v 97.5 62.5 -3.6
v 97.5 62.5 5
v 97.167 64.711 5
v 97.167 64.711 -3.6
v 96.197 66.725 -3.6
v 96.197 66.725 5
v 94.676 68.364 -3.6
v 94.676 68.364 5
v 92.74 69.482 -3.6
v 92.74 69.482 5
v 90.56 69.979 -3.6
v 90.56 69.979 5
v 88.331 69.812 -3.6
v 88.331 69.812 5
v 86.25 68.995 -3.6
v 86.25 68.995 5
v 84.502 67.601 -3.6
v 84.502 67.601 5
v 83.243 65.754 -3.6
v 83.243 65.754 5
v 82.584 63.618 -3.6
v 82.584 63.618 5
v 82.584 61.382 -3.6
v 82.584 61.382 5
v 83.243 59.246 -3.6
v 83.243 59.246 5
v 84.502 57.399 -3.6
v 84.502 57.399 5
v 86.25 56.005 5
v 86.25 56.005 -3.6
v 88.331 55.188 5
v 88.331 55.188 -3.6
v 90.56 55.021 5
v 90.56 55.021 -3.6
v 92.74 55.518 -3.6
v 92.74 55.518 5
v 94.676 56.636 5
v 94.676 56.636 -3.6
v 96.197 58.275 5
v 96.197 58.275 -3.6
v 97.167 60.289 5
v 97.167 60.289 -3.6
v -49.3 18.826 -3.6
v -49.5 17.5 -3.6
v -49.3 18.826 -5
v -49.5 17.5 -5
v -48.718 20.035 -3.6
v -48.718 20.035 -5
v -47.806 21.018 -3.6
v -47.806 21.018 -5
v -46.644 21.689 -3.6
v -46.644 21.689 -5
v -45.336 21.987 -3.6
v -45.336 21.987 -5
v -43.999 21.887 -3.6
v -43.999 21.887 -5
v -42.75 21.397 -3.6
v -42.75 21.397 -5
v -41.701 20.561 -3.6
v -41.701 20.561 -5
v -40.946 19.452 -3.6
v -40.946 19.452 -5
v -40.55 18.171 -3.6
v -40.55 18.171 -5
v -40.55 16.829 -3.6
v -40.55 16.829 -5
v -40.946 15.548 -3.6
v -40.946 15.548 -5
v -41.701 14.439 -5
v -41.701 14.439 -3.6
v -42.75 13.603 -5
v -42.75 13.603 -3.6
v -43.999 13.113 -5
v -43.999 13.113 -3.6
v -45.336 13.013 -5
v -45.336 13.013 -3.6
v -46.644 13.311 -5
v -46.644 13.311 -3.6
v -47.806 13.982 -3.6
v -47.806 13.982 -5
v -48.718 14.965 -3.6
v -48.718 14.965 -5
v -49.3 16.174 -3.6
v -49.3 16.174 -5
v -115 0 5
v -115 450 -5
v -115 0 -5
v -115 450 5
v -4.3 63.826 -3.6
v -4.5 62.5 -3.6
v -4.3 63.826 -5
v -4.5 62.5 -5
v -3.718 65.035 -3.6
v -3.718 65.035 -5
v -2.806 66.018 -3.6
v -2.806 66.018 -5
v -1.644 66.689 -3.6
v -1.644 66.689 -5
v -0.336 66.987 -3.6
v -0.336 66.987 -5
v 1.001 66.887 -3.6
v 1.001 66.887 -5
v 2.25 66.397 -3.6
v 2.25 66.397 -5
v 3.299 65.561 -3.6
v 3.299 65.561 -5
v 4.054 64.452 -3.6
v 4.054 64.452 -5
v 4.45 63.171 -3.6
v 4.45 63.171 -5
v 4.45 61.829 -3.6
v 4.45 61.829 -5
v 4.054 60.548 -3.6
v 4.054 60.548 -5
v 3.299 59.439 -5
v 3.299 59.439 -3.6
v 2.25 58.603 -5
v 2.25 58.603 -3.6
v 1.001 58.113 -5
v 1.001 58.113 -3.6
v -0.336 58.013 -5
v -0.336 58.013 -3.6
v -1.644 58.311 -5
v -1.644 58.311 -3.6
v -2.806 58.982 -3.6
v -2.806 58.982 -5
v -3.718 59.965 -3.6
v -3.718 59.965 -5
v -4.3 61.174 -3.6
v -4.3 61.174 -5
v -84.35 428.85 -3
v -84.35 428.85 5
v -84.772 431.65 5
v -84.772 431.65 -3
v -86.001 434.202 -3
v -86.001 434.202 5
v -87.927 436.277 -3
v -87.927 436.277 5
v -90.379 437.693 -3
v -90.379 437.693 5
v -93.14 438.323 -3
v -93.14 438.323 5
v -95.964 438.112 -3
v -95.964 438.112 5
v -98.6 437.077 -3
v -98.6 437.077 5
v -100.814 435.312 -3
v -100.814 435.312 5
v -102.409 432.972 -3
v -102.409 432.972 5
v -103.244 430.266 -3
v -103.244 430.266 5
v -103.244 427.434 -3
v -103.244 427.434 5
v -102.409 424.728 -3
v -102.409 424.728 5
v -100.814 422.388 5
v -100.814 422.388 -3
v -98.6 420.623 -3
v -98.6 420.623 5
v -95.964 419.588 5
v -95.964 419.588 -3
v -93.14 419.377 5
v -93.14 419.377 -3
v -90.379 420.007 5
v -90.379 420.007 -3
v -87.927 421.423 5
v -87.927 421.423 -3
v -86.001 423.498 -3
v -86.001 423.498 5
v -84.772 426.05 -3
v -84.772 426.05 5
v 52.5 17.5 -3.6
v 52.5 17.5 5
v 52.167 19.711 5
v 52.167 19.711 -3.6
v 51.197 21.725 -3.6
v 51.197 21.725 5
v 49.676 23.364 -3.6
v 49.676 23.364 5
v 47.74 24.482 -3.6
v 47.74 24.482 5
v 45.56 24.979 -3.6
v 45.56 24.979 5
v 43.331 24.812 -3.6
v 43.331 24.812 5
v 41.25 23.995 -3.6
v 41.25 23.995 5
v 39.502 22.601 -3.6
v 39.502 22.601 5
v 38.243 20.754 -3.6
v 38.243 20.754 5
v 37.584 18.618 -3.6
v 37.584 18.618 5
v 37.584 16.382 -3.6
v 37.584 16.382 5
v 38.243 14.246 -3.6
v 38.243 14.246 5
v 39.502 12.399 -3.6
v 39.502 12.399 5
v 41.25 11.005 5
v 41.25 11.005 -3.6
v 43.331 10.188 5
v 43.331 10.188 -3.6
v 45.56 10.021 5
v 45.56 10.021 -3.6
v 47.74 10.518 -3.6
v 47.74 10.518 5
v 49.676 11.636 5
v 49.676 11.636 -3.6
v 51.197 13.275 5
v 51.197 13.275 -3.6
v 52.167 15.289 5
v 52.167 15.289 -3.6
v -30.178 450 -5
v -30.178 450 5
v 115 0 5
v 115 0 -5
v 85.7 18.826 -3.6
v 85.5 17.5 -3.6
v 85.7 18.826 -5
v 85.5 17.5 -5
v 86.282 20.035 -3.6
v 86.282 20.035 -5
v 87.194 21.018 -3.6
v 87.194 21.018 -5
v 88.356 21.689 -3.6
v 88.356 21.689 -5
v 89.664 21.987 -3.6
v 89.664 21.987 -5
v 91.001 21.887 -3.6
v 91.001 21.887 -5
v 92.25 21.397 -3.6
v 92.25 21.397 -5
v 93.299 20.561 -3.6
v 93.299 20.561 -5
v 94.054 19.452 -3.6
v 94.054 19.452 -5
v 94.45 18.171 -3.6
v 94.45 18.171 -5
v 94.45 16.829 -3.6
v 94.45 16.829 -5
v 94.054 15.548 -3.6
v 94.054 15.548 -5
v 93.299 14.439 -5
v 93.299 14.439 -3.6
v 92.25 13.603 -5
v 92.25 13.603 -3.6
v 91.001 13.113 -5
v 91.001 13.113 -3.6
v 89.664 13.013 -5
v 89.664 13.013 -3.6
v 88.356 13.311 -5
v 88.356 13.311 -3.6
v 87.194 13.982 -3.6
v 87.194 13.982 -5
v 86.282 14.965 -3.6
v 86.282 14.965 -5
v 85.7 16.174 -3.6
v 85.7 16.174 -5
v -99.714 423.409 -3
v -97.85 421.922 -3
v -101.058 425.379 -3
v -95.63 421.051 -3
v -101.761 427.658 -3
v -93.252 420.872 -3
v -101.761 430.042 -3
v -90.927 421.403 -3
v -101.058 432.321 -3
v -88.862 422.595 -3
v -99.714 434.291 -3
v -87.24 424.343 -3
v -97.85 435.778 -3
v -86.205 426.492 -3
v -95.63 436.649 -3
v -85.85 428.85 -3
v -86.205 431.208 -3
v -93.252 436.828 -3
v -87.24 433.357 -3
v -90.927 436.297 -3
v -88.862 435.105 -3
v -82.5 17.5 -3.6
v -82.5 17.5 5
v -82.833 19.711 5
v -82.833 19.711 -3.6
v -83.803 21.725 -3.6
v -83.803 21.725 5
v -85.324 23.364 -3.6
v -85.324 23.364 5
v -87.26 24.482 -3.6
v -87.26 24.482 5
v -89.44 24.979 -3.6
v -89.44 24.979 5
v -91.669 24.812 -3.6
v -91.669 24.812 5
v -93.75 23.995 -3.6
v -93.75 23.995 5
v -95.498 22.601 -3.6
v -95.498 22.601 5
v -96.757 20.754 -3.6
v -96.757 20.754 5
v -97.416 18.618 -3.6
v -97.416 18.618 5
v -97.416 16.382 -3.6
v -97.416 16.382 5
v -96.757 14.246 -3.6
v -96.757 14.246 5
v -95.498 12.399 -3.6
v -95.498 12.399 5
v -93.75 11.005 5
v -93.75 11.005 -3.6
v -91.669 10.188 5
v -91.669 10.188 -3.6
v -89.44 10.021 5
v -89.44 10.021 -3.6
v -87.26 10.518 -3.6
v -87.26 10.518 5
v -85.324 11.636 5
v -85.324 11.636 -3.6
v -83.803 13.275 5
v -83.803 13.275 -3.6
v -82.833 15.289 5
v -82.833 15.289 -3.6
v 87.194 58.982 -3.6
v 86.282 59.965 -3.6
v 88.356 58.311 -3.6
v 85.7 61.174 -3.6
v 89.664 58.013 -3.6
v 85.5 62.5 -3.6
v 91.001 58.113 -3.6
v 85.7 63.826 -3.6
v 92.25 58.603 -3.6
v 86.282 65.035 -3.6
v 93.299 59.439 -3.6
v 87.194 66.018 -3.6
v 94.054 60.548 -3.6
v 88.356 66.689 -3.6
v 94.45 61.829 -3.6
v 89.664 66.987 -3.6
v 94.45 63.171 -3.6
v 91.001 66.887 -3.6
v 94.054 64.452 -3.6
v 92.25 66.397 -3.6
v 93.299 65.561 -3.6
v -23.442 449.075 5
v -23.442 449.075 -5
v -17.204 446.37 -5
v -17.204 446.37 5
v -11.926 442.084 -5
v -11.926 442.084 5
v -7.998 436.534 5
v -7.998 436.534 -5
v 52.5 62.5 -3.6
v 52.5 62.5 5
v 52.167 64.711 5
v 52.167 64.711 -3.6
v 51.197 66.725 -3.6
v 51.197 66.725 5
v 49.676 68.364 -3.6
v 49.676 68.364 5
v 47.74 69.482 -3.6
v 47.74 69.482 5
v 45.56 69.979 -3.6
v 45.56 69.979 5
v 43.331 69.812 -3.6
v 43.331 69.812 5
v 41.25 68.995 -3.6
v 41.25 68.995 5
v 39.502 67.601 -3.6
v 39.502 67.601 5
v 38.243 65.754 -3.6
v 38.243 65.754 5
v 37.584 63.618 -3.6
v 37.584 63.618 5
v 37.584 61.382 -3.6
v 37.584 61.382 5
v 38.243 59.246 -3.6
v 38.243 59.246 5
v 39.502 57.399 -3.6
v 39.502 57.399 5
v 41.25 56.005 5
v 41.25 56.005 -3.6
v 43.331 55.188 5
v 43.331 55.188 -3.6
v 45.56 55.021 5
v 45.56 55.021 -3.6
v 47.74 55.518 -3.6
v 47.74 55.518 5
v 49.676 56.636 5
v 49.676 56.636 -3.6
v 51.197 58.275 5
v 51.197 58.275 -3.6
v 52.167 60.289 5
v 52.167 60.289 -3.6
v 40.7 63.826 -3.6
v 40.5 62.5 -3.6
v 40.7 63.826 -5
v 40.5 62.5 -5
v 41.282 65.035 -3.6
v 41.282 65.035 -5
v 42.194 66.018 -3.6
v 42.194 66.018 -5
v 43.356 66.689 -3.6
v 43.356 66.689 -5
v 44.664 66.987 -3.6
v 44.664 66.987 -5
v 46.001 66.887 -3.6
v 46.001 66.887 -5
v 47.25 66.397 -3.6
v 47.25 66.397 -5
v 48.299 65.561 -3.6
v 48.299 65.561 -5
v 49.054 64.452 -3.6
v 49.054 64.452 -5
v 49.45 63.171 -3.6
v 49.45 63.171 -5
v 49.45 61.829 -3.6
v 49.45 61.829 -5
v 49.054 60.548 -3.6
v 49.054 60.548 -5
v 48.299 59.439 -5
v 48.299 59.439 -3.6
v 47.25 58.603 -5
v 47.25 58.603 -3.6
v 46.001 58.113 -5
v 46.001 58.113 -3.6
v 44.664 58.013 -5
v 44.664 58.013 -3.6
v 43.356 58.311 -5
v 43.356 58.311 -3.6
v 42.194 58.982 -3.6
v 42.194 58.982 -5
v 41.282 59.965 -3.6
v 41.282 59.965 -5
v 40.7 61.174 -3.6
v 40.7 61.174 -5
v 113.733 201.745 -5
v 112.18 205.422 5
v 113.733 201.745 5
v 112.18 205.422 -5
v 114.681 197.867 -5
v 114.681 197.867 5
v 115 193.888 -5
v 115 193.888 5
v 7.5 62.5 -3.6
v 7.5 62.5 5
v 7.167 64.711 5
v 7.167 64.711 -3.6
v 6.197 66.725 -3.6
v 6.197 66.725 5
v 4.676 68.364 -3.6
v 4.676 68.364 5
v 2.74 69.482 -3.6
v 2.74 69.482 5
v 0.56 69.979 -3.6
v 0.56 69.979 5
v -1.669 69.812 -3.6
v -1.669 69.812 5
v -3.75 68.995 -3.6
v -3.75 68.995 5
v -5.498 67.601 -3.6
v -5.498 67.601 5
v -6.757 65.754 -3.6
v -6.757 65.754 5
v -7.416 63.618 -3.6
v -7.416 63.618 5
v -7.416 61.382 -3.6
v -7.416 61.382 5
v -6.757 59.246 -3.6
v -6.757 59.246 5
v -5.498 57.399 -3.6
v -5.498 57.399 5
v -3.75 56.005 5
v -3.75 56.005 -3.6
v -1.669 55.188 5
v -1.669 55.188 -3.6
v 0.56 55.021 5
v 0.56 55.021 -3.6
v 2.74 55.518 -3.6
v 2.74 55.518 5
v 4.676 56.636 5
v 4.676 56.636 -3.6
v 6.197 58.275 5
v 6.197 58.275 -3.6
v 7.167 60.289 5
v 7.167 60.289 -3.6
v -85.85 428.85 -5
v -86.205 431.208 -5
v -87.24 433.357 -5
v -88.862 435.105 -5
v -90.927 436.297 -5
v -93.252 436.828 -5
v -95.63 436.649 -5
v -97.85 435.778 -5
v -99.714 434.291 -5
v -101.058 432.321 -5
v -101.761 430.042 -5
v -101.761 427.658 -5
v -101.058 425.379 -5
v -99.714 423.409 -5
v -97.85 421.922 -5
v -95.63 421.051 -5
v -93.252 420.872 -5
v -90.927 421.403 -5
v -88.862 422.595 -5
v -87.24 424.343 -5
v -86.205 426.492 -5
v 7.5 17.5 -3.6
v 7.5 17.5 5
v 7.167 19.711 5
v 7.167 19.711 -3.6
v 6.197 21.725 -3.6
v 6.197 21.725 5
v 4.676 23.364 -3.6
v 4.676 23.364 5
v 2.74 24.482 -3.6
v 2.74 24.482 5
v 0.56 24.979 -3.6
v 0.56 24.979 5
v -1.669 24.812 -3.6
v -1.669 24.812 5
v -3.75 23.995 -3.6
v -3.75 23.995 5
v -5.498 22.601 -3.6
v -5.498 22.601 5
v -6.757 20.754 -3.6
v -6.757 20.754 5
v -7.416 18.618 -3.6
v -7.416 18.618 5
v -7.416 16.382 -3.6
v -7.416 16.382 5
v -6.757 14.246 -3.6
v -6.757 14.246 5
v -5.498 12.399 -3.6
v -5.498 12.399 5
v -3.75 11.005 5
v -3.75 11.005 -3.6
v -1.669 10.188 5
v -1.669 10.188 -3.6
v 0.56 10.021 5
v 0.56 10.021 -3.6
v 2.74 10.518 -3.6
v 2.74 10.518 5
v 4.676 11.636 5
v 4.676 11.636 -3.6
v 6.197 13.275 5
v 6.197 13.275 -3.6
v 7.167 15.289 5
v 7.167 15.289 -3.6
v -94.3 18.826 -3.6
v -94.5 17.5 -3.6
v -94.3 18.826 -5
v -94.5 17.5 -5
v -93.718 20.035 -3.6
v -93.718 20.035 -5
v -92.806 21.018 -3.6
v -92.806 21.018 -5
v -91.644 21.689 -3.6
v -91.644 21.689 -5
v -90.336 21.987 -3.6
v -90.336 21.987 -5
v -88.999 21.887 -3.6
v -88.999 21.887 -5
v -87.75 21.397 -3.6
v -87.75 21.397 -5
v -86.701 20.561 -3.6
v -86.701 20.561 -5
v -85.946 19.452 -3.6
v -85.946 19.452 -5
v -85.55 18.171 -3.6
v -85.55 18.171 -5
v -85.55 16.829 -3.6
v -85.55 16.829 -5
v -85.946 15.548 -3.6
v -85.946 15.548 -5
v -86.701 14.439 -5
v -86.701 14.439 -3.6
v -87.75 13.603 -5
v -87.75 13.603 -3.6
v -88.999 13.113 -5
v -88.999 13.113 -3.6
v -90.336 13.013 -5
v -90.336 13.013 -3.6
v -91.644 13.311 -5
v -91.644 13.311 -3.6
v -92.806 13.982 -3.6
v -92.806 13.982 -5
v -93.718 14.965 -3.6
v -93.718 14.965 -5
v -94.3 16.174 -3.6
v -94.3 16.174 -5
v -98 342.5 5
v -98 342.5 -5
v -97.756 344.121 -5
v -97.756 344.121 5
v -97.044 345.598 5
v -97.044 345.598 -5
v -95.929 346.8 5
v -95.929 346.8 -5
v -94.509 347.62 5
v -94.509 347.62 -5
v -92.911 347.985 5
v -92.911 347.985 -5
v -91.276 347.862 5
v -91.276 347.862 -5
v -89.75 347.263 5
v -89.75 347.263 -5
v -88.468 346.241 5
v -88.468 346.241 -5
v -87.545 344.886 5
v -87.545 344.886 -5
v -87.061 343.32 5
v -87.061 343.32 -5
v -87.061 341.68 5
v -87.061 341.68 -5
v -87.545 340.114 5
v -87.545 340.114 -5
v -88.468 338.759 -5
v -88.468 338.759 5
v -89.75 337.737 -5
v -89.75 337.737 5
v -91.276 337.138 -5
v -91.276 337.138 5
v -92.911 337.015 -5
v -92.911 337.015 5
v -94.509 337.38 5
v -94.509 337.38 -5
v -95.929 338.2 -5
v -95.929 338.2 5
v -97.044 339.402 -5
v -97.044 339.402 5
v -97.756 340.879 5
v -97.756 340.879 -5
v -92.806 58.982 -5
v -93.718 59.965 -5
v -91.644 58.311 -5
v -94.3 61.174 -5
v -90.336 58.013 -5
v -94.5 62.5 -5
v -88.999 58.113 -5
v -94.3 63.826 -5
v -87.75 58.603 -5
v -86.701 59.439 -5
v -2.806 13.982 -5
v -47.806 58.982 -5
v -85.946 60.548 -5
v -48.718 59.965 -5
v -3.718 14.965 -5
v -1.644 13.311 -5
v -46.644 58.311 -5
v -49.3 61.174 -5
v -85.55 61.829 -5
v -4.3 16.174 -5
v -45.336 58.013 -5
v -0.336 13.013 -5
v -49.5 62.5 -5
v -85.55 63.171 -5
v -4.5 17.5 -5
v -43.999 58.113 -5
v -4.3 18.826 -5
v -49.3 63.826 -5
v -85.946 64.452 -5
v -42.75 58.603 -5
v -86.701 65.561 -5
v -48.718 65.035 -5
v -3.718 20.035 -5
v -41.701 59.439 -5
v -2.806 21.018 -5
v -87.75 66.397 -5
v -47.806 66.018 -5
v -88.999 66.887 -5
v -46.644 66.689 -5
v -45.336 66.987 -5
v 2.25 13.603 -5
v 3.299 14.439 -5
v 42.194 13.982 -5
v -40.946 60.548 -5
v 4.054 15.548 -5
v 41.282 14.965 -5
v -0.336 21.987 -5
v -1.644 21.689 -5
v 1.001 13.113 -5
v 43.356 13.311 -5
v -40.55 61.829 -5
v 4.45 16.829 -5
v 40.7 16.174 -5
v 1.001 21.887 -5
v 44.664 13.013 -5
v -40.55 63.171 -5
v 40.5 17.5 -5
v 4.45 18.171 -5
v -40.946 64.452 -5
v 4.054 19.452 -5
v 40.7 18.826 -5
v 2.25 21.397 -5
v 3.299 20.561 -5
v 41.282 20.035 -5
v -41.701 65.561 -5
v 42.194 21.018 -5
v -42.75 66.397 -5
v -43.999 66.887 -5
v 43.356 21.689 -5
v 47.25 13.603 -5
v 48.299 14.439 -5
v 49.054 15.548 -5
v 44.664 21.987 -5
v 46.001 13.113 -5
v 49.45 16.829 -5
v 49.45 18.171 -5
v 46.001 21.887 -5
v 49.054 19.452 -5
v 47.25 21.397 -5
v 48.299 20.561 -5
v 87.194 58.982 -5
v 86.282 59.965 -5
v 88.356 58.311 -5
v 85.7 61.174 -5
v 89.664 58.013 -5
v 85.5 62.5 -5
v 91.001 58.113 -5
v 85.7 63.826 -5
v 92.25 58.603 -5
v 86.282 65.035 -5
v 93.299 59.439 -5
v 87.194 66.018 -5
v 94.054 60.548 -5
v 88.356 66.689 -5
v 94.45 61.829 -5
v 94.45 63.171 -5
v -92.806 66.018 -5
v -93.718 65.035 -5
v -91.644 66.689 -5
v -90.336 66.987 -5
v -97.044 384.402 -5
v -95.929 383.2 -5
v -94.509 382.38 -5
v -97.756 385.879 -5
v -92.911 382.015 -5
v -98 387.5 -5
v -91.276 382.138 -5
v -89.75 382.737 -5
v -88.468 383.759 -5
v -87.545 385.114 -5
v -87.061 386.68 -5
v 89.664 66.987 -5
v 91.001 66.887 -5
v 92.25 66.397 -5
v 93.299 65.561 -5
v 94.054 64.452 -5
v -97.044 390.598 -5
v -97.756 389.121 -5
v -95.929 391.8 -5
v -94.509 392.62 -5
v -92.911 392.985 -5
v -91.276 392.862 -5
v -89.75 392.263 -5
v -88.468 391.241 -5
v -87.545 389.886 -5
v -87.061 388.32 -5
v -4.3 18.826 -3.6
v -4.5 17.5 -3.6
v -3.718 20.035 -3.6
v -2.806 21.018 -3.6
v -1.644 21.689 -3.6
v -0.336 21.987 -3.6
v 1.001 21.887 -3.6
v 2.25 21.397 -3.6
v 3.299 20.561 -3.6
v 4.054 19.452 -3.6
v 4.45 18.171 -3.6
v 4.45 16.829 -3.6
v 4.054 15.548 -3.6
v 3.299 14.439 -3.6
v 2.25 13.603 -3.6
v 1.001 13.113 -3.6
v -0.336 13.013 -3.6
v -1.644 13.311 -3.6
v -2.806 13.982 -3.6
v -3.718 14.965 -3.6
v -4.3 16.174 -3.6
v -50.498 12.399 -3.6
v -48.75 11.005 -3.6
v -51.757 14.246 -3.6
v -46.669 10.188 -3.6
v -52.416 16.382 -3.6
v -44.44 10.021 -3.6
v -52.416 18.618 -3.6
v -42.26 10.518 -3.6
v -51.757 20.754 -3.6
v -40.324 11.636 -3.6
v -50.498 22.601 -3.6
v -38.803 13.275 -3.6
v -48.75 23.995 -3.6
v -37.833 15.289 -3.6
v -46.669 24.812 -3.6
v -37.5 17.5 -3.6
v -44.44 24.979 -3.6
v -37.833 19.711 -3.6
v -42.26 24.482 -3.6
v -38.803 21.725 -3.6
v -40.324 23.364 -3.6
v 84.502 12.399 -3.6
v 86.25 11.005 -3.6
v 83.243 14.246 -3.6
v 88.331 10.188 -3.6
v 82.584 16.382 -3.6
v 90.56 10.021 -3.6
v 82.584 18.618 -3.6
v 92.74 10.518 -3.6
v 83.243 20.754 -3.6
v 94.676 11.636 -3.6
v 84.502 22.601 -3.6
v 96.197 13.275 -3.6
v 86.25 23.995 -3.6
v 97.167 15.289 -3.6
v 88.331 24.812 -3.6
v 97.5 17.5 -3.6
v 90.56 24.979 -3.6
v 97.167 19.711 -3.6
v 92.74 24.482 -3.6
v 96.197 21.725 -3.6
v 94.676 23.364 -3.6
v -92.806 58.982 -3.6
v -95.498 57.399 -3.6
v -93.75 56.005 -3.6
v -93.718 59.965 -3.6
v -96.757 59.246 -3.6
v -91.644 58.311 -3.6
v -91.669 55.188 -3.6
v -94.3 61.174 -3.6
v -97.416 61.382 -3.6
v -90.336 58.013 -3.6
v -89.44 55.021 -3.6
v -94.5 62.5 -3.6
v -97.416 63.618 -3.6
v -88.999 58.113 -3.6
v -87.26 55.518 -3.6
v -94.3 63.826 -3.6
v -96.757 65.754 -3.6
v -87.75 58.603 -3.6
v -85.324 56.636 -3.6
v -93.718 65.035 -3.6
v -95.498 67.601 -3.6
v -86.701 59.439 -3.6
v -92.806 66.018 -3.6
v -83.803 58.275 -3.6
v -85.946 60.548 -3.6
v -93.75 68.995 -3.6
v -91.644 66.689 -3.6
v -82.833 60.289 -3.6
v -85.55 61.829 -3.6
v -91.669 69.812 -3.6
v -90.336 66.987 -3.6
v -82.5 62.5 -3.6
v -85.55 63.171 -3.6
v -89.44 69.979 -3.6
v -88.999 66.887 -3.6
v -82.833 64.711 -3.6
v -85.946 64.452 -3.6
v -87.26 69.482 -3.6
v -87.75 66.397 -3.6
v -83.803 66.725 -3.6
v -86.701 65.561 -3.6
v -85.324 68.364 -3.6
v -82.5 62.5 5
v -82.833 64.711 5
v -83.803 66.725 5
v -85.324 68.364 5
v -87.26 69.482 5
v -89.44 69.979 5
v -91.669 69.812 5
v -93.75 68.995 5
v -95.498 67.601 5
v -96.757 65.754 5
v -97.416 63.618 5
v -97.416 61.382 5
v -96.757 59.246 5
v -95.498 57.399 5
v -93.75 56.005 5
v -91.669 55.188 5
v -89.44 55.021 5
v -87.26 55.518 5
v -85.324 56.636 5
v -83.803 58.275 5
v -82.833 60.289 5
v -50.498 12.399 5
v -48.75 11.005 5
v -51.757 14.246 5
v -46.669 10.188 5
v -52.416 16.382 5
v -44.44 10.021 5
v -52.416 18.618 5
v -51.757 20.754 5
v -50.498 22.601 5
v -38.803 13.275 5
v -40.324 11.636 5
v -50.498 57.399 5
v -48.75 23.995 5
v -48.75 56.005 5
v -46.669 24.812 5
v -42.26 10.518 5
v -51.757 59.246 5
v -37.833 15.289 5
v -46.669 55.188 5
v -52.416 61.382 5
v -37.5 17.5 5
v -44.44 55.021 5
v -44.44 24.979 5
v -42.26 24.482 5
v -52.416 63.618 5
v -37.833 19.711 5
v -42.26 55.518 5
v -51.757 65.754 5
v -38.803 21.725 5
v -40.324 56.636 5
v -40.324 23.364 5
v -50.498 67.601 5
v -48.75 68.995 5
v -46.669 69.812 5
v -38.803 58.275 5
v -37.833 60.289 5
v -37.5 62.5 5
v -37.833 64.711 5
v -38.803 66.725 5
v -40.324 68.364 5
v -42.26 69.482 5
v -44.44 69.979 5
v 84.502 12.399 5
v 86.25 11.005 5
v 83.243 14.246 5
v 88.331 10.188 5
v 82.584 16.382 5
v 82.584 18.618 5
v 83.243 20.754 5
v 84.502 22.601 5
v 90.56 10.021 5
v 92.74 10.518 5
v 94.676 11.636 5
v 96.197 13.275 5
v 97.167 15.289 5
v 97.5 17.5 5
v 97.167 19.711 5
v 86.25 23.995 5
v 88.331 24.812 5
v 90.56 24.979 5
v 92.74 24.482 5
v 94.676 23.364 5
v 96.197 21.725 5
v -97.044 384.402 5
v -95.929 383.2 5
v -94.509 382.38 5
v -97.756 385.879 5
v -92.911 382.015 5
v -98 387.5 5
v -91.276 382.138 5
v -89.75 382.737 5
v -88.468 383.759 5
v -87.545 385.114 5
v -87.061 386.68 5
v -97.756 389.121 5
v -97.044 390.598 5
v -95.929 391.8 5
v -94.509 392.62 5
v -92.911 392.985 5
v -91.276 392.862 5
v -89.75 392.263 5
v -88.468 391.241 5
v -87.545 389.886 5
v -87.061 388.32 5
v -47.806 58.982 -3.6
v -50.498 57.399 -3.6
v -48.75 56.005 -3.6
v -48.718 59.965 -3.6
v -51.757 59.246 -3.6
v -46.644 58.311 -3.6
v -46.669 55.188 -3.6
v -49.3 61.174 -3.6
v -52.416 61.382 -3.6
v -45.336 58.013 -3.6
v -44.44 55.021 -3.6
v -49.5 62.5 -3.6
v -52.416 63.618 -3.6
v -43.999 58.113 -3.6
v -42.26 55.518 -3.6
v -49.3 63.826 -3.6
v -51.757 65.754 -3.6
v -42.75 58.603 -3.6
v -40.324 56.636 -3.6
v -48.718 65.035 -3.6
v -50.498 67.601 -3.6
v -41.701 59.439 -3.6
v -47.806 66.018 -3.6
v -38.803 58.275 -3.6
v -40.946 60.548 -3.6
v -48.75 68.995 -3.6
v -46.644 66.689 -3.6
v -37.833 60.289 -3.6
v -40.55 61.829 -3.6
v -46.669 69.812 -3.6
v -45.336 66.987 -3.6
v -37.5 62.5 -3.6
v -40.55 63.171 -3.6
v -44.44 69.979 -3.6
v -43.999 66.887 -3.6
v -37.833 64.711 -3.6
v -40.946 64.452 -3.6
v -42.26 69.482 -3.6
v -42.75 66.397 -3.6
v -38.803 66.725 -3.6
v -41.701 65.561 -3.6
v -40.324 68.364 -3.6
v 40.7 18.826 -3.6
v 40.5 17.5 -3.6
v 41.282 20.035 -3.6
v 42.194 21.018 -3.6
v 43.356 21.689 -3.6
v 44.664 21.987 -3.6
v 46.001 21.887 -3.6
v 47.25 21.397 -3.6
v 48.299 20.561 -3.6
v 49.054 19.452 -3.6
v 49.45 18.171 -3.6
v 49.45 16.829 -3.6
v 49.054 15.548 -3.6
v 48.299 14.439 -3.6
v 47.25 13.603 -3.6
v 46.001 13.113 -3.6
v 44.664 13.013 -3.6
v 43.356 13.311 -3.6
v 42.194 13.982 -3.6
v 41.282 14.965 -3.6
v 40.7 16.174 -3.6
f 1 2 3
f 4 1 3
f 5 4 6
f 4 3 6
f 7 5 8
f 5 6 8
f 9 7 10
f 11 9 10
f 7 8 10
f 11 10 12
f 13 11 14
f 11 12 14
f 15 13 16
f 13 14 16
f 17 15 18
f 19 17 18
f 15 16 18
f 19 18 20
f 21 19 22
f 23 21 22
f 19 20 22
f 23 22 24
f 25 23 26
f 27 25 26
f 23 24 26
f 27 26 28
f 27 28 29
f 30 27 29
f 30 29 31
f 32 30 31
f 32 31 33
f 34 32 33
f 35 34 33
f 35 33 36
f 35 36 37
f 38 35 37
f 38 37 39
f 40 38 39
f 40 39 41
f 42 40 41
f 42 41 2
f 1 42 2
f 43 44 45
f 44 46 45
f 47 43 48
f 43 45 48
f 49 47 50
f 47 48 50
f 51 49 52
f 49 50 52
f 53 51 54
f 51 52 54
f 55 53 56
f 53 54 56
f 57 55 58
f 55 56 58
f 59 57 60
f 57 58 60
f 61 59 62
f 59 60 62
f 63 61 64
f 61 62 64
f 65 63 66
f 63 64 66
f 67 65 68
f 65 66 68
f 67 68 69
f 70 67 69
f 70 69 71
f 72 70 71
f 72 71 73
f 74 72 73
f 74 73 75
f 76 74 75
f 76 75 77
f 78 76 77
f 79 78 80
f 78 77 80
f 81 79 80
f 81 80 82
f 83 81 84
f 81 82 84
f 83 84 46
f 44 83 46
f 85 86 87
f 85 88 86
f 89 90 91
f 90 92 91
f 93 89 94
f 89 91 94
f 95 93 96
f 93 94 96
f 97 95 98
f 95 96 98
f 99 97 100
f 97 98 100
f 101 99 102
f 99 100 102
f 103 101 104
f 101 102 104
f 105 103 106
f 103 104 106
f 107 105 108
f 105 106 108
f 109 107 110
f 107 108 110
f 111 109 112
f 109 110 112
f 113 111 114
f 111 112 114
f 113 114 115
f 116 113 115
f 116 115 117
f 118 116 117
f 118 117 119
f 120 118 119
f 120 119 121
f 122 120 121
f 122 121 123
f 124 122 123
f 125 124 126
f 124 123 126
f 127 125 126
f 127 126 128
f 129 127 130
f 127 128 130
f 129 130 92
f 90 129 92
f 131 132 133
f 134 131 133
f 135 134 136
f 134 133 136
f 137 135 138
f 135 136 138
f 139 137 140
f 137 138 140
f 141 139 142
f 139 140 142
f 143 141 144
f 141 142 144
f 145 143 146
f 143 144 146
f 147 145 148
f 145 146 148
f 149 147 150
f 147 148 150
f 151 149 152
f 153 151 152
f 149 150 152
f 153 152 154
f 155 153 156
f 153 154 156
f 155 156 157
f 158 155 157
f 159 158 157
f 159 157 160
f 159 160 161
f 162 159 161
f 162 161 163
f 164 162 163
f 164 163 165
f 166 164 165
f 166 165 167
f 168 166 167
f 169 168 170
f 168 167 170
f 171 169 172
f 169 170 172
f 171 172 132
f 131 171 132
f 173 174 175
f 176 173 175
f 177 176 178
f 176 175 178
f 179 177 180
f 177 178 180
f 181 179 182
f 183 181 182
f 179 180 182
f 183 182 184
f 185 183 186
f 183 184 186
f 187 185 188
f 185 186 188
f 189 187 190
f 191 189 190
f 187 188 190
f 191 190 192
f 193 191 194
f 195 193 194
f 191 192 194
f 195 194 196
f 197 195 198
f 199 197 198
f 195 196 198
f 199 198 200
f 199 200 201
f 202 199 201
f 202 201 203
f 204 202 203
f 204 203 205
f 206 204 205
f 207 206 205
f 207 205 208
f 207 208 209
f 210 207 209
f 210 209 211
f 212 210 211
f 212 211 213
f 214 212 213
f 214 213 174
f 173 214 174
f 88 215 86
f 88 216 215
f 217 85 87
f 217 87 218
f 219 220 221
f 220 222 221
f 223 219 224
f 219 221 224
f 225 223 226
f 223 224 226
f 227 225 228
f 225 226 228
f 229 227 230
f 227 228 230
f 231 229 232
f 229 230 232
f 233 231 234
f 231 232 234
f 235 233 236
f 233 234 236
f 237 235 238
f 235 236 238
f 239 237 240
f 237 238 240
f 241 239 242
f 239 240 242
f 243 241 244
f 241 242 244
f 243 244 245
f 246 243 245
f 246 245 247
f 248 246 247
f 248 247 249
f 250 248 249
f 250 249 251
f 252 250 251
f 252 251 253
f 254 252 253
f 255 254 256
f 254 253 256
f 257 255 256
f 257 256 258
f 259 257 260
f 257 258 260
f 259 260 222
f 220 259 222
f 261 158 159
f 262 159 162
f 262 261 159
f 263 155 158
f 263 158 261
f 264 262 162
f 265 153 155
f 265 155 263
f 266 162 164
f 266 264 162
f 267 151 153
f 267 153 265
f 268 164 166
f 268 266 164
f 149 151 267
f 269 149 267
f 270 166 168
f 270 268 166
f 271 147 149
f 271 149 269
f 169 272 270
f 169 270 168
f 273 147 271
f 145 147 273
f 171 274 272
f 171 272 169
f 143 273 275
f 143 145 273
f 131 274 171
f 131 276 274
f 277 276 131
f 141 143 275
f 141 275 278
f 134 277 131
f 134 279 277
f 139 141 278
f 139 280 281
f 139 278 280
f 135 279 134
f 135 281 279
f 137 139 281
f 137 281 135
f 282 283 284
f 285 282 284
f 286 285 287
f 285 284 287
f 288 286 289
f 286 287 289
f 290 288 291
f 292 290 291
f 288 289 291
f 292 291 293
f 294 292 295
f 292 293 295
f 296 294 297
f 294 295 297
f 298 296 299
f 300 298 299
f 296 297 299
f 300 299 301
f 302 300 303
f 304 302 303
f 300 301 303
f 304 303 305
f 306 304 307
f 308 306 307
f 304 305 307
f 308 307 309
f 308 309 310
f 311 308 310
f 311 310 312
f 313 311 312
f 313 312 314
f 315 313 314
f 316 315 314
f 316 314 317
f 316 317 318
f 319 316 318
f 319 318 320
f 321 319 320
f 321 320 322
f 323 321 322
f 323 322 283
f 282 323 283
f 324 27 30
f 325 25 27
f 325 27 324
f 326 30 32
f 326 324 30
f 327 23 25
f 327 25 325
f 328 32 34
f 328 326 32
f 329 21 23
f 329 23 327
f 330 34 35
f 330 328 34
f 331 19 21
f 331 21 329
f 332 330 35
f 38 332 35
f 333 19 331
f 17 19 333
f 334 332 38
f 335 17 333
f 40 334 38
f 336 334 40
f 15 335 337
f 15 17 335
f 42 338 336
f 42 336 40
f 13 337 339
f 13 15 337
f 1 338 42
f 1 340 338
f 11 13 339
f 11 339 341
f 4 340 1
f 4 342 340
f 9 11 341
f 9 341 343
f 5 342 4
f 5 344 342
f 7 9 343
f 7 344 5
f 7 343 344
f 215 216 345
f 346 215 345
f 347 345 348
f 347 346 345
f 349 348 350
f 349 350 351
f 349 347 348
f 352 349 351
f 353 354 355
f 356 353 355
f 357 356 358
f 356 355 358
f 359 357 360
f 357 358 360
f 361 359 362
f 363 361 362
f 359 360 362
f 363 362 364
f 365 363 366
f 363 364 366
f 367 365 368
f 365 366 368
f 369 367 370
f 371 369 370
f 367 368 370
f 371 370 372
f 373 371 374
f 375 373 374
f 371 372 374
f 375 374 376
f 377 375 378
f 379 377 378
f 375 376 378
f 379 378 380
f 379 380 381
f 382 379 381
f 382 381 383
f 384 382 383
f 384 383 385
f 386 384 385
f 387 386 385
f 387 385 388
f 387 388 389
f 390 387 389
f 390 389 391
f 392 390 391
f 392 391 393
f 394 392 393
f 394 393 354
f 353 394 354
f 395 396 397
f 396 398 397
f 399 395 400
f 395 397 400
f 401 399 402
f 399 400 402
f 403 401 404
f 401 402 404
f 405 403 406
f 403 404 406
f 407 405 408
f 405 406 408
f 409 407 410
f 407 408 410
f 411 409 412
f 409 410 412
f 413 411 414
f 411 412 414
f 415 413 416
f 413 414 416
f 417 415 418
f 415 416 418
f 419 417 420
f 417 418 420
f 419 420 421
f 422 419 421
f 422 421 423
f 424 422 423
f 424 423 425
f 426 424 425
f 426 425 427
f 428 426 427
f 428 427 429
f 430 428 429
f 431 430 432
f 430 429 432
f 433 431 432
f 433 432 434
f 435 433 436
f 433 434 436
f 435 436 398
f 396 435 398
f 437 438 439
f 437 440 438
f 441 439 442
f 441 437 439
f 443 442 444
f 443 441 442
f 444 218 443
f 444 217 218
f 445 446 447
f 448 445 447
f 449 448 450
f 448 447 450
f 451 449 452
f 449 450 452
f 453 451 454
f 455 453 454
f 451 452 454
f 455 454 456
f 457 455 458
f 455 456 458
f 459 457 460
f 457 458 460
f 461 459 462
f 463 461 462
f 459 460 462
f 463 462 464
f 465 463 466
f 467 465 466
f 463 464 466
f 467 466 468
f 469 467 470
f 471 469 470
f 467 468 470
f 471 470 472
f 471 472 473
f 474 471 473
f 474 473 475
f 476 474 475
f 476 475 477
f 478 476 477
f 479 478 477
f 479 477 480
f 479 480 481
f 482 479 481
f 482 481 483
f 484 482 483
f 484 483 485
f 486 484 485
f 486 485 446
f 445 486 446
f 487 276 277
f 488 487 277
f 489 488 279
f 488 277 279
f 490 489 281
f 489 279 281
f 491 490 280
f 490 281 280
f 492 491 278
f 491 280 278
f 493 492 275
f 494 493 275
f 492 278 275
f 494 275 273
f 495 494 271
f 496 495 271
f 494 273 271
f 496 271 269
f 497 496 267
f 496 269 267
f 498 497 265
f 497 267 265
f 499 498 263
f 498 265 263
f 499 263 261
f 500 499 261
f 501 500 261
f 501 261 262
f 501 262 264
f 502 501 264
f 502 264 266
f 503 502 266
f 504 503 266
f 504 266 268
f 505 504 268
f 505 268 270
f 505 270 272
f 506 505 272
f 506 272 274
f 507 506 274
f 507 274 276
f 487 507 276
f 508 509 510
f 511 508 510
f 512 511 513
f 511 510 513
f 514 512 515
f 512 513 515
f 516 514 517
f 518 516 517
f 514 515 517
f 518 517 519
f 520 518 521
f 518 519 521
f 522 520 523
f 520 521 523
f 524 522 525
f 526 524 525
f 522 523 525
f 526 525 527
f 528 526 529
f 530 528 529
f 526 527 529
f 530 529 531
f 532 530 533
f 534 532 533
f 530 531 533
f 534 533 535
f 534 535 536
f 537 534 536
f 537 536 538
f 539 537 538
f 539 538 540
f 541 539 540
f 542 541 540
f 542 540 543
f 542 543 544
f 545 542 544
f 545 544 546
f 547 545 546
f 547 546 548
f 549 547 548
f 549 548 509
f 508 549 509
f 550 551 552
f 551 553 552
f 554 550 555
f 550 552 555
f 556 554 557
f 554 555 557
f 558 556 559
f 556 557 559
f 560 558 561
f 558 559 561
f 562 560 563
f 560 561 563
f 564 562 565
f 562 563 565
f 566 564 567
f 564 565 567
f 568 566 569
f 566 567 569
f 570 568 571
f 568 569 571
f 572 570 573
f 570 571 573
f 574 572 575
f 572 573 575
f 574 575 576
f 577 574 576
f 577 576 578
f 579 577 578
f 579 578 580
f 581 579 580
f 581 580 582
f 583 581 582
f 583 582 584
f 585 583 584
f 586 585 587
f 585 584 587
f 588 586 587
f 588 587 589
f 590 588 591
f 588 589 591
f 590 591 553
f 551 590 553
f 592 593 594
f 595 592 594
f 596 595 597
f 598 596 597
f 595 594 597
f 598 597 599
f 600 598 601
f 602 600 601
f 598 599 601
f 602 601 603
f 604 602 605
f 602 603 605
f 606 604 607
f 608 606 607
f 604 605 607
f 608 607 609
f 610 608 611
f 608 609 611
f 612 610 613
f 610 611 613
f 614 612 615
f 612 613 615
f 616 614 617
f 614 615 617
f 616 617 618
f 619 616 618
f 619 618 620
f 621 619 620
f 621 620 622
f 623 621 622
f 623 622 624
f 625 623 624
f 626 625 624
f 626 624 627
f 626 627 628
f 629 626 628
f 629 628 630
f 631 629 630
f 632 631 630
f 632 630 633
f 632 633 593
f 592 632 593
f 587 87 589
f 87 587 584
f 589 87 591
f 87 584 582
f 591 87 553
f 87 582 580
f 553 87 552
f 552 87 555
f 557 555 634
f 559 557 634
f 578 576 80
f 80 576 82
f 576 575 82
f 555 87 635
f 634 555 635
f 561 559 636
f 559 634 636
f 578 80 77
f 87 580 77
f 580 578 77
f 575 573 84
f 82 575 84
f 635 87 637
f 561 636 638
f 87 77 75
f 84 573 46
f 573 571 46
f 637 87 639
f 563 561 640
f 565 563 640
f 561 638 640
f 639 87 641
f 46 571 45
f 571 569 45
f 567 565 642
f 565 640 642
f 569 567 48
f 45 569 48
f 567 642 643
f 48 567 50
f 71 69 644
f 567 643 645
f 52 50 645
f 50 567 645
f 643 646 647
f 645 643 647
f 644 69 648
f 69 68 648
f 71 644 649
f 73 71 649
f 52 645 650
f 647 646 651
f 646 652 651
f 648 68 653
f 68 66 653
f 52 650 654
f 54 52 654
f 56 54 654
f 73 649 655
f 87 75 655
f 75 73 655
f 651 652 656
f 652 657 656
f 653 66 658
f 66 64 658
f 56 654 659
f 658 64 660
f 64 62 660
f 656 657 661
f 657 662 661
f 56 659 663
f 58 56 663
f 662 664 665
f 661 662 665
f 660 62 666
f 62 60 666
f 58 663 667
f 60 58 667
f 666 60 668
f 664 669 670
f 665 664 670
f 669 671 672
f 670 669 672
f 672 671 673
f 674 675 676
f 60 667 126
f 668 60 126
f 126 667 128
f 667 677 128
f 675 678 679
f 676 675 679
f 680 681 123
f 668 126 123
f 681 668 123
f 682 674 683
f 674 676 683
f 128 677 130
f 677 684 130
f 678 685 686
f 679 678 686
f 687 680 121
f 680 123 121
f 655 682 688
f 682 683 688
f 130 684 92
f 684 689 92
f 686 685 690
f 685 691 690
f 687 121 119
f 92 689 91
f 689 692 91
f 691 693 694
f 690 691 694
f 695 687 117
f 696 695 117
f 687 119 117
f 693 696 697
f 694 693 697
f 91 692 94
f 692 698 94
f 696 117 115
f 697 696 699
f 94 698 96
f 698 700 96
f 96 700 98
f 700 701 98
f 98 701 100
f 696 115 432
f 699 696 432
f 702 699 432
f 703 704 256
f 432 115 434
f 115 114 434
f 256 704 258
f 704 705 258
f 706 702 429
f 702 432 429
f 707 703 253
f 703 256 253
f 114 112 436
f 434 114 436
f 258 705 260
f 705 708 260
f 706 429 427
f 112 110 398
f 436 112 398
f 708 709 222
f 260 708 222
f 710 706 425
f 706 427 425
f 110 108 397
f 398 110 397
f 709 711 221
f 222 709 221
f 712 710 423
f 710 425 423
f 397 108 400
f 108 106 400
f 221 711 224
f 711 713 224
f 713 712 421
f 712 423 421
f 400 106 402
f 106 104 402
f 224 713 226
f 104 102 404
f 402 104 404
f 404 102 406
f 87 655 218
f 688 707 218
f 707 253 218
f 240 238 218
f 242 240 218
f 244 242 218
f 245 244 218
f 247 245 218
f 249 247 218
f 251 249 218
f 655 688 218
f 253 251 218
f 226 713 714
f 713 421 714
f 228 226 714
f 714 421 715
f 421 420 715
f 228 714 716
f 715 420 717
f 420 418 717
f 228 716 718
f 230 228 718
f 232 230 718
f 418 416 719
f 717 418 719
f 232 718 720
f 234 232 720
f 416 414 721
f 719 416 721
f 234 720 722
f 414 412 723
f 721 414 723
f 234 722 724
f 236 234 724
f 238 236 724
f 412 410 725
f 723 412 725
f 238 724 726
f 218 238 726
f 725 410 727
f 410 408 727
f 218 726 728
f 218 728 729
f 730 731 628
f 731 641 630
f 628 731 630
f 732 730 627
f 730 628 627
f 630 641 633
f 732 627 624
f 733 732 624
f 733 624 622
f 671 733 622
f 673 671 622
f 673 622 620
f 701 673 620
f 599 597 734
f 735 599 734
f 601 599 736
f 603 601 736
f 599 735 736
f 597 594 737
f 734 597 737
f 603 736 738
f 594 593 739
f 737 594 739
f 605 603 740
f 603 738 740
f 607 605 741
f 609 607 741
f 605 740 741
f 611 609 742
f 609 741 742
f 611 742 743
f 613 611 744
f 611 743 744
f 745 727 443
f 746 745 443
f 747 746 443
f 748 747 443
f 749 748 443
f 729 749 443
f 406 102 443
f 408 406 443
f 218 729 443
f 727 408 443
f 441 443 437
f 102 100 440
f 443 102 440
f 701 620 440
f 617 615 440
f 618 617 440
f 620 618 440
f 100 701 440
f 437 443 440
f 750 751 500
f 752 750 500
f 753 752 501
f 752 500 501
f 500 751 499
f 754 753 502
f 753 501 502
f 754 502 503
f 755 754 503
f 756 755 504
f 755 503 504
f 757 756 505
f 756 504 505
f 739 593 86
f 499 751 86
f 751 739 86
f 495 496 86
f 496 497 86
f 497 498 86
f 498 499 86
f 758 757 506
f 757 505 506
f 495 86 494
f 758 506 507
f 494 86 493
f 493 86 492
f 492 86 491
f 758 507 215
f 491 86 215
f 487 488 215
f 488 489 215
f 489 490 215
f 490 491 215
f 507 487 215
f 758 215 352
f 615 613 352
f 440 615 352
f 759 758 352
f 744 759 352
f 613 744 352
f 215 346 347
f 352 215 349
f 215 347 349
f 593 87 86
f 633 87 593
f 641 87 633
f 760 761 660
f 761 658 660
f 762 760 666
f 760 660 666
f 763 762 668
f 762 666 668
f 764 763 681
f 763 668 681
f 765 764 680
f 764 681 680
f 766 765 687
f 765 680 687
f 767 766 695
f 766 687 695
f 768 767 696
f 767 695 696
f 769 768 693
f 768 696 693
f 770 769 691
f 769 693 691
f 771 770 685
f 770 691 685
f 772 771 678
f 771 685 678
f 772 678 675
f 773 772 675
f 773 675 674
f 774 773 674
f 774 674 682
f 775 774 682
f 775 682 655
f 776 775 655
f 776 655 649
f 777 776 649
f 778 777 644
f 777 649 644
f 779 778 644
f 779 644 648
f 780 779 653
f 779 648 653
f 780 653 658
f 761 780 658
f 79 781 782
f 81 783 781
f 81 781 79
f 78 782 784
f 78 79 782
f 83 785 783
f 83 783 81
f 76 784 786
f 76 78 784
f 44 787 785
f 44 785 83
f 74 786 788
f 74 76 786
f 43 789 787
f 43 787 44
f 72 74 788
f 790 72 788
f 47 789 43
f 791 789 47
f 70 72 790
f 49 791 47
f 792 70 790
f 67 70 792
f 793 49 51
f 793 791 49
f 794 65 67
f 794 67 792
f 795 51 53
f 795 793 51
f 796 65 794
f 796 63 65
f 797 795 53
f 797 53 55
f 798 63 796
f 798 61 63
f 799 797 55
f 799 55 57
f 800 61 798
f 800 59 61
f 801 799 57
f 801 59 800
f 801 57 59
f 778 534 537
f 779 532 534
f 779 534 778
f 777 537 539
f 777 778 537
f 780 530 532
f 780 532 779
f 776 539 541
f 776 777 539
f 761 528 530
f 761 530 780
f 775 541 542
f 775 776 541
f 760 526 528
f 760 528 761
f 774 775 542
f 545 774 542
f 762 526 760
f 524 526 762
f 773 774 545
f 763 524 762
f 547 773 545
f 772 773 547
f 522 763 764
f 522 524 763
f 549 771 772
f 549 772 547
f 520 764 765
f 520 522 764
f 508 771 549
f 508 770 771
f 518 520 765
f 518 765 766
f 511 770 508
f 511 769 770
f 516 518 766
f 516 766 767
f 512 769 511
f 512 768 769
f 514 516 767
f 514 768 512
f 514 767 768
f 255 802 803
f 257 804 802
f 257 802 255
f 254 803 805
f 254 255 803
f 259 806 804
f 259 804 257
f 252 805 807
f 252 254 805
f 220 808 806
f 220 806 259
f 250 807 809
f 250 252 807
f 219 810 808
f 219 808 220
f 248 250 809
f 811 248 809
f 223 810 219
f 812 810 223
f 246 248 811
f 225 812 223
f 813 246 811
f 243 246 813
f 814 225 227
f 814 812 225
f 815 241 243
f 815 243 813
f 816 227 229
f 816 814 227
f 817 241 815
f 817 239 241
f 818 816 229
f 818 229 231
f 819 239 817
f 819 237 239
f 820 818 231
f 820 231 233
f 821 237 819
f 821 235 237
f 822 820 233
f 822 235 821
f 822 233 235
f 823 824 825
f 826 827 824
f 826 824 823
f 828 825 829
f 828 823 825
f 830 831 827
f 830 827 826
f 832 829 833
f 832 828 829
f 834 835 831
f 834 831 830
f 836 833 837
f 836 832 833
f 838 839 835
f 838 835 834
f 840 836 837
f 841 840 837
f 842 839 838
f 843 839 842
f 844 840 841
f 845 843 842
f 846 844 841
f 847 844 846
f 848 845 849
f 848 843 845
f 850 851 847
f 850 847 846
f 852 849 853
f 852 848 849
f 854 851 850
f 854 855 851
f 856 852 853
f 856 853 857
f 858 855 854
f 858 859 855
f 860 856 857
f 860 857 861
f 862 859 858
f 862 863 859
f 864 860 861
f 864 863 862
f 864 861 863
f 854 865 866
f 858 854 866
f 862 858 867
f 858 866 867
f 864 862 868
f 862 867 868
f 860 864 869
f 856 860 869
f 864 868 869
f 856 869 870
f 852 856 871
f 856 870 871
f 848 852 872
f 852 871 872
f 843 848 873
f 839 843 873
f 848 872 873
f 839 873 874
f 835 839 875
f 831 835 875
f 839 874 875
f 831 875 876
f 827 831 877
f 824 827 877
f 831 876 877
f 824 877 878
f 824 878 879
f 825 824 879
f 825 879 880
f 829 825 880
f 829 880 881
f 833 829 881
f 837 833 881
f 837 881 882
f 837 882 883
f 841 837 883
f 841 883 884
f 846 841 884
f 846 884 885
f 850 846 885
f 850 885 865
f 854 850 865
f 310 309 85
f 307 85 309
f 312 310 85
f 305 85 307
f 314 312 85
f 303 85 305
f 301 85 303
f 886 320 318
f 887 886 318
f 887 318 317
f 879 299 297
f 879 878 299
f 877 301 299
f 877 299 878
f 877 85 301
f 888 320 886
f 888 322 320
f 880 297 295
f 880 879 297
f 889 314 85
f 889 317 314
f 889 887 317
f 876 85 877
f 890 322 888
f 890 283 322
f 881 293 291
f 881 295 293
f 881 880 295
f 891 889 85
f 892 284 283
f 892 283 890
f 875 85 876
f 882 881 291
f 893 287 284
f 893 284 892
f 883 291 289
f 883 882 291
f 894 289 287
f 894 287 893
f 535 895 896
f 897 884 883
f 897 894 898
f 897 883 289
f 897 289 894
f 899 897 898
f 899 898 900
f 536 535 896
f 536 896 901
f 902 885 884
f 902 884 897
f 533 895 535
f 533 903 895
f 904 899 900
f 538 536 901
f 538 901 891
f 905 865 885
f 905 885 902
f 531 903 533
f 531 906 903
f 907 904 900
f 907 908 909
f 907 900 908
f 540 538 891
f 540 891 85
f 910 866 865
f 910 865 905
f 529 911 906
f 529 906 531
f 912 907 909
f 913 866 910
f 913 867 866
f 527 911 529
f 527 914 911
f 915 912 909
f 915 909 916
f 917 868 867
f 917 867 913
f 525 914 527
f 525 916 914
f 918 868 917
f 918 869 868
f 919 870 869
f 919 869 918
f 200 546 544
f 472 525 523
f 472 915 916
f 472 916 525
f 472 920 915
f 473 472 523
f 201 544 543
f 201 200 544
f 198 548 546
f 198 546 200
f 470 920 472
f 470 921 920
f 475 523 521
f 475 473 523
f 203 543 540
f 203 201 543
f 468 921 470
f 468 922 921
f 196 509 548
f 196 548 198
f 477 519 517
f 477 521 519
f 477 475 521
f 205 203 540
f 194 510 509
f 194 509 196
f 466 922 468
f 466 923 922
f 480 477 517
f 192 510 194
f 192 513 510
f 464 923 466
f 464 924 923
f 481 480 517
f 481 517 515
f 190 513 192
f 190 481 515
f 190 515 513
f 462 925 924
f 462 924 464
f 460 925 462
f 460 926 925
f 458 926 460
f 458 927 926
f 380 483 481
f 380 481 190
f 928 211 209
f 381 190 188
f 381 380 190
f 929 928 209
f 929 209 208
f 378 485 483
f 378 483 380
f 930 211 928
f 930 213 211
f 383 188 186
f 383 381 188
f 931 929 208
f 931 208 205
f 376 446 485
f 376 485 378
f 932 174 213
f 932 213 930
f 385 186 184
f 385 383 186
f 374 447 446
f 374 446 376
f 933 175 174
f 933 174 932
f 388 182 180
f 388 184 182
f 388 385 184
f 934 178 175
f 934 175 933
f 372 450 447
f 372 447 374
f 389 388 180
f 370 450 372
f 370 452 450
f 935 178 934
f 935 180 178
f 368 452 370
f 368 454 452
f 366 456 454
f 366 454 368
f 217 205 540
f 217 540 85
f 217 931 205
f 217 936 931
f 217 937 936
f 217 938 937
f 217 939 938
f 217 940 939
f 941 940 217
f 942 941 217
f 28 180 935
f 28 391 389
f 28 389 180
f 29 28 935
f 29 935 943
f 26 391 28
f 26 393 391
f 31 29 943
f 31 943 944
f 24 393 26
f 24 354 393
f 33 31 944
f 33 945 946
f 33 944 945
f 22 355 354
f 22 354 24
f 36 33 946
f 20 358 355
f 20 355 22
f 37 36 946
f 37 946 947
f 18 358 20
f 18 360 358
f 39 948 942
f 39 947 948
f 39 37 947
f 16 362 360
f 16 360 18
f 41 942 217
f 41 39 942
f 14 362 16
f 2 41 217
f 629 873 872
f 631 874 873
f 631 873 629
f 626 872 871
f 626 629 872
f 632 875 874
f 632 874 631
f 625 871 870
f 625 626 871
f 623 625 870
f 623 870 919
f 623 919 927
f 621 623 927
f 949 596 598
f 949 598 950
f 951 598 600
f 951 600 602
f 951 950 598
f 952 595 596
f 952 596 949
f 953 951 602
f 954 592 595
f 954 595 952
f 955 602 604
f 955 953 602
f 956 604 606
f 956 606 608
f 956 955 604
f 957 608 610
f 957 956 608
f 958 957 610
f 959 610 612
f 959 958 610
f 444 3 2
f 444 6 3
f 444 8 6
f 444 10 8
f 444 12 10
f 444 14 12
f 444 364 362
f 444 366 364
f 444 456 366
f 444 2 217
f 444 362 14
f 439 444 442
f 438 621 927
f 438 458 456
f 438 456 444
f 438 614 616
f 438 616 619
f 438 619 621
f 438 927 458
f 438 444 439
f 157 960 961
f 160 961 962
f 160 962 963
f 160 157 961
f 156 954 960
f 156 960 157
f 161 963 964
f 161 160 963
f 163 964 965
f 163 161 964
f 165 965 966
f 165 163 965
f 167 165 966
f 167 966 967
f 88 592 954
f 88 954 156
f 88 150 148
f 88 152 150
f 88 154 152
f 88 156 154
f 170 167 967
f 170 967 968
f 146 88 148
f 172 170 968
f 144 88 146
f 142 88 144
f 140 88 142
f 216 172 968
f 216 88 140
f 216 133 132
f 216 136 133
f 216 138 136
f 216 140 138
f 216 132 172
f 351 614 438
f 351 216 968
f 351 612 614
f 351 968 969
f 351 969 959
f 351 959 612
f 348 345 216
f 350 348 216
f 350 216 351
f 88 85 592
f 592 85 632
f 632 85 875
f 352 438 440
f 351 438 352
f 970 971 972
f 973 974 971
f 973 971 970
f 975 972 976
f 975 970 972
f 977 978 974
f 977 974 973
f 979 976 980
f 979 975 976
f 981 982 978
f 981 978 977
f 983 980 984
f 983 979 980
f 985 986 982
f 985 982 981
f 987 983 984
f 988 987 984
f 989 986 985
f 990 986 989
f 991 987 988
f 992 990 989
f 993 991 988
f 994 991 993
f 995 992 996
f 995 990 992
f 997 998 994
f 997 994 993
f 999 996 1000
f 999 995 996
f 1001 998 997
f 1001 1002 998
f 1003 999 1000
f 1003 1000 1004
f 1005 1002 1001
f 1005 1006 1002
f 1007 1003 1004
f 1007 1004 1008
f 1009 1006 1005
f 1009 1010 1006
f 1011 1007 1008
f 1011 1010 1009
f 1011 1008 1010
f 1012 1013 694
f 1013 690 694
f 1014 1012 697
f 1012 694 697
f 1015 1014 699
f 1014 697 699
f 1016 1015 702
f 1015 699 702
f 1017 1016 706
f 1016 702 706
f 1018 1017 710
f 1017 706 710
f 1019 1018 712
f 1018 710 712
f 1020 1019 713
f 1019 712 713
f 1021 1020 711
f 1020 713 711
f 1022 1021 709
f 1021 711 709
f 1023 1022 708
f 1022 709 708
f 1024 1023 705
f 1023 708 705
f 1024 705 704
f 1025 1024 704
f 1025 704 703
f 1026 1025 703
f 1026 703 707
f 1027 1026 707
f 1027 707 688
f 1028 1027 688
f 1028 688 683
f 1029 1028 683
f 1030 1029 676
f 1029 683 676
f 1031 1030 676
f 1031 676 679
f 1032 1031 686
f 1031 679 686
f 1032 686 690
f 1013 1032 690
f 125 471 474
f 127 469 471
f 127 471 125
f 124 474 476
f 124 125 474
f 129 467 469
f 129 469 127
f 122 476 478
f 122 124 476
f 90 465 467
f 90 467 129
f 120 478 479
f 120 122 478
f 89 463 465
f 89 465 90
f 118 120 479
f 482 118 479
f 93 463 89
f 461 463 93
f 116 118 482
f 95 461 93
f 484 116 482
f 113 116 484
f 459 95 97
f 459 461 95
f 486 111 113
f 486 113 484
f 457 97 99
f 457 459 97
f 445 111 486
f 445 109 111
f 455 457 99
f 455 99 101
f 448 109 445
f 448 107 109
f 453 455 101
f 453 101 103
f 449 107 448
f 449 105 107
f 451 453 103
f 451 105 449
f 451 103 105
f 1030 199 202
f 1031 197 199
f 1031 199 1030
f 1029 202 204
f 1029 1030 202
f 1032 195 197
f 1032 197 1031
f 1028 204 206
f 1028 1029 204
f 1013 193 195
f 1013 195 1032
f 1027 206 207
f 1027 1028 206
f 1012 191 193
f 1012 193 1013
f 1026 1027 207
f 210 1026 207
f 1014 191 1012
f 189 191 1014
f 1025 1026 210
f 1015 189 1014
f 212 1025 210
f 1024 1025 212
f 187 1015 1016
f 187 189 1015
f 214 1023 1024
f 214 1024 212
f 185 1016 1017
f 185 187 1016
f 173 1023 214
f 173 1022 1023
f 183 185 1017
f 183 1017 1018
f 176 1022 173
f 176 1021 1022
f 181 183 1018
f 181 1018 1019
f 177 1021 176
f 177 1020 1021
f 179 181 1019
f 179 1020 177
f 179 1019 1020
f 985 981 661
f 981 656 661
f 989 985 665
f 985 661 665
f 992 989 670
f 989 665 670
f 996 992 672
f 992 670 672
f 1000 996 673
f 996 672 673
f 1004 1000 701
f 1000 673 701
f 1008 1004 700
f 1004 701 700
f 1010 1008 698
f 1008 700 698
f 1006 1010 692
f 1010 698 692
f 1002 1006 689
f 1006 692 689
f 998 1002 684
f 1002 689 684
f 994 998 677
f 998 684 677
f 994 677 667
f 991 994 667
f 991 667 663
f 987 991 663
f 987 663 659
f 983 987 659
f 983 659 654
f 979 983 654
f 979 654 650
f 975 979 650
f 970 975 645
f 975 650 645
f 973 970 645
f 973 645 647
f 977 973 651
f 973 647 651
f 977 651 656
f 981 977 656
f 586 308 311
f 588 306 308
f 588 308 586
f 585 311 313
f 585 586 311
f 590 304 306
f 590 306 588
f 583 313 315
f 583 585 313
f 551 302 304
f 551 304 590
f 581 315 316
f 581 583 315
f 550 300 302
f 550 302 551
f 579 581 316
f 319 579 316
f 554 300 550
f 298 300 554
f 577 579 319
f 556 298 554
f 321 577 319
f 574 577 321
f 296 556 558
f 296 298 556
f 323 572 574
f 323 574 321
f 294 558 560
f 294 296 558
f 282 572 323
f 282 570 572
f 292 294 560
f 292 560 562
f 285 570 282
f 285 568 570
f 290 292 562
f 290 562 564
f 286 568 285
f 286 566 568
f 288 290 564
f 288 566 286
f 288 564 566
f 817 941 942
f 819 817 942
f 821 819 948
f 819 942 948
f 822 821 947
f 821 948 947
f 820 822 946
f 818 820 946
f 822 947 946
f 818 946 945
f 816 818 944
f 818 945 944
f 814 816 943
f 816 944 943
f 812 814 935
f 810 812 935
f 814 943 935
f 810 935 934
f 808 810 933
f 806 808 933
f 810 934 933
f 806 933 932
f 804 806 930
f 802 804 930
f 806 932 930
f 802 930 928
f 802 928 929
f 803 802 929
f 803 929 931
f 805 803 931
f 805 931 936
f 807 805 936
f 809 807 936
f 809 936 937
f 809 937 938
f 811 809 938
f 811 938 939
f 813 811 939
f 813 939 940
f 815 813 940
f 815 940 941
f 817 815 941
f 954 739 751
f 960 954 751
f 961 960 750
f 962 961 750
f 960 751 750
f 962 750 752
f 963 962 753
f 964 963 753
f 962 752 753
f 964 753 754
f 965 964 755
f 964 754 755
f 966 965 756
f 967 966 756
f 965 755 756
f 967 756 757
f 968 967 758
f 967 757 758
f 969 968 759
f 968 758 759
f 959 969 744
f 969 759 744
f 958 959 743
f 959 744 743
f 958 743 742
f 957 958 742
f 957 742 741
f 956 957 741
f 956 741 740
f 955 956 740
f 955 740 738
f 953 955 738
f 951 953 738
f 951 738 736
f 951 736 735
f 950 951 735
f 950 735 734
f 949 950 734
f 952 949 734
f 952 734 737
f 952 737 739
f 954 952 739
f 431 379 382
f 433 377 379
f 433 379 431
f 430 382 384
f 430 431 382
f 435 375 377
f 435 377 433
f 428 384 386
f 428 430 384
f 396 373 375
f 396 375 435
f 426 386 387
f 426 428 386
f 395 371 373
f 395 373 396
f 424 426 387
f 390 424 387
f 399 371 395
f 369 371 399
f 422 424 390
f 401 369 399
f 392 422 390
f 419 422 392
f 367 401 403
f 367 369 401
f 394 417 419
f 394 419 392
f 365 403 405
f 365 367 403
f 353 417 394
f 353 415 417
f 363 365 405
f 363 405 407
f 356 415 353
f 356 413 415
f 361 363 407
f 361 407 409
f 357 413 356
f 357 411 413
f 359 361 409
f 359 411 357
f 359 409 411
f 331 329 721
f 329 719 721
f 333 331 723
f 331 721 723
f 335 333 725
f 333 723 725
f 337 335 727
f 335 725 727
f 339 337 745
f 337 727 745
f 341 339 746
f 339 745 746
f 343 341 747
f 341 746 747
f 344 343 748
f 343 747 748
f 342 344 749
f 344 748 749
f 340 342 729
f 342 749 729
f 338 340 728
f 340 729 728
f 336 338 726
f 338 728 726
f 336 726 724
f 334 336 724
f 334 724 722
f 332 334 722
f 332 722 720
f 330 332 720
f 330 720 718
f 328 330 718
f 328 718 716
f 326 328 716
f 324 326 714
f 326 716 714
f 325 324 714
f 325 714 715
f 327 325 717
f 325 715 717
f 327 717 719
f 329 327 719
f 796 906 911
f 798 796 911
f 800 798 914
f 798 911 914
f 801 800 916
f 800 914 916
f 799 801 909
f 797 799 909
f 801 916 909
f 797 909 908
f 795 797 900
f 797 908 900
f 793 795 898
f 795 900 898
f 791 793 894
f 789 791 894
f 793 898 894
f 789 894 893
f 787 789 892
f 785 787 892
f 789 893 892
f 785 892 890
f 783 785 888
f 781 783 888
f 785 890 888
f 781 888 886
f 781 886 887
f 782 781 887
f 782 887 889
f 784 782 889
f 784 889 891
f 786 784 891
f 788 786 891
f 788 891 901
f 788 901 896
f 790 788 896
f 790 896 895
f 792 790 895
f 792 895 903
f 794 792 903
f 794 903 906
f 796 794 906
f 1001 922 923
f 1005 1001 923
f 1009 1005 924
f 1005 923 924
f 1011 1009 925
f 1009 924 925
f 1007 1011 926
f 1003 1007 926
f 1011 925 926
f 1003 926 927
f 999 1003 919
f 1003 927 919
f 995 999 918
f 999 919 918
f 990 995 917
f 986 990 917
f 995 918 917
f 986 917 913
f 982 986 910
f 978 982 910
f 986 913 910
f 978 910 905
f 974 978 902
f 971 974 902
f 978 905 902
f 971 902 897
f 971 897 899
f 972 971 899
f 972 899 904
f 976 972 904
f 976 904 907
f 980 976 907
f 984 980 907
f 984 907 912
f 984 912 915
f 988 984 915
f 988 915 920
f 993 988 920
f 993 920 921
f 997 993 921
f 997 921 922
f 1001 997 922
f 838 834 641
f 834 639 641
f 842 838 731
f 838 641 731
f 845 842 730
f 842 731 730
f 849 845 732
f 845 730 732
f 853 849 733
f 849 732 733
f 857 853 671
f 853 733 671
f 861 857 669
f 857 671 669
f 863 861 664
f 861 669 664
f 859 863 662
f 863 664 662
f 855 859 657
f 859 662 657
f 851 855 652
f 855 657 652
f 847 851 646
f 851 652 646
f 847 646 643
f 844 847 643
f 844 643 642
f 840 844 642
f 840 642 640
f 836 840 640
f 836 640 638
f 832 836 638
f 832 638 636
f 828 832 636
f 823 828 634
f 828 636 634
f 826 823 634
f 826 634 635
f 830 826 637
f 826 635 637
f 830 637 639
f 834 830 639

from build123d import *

# Parameters (mm, degrees)
BOSS_EXTRUDE1_DEPTH                                 = 5
CBORE_FOR_M8_HEX_SOCKET_HEAD_CAP_SCREW1_D           = 9
CBORE_FOR_M8_HEX_SOCKET_HEAD_CAP_SCREW1_CBORE_D     = 15
CBORE_FOR_M8_HEX_SOCKET_HEAD_CAP_SCREW1_CBORE_DEPTH = 8.6
SKETCH5_R                                           = 9.5
CUT_EXTRUDE2_DEPTH                                  = 8
SKETCH6_R                                           = 8
CUT_EXTRUDE3_DEPTH                                  = 465.530946224
FILLET1_R                                           = 25
M10_CLEARANCE_HOLE1_D                               = 11
M10_CLEARANCE_HOLE1_DEPTH                           = 25
M10_CLEARANCE_HOLE1_TIP                             = 3.304733405


with BuildPart() as part:
    # Sketch1 → Boss-Extrude1 (new, symmetric)
    with BuildSketch(Plane.XY):
        Polygon((-115, 450), (-115, 0), (115, 0), (115, 200), (-15, 450), align=None)
    extrude(amount=BOSS_EXTRUDE1_DEPTH, both=True)

    # CBORE for M8 Hex Socket Head Cap Screw1 (through all)
    with Locations(Plane.XY.offset(5)):
        with Locations((-90, 17.5), (-45, 17.5), (45, 17.5), (90, 17.5), (0, 17.5), (-90, 62.5), (-45, 62.5), (45, 62.5), (90, 62.5), (0, 62.5)):
            CounterBoreHole(CBORE_FOR_M8_HEX_SOCKET_HEAD_CAP_SCREW1_D / 2, CBORE_FOR_M8_HEX_SOCKET_HEAD_CAP_SCREW1_CBORE_D / 2, CBORE_FOR_M8_HEX_SOCKET_HEAD_CAP_SCREW1_CBORE_DEPTH)

    # Sketch5 → Cut-Extrude2 (cut)
    with BuildSketch(Plane.XY.offset(5)):
        with Locations((-93.85, 428.85)):
            Circle(SKETCH5_R)
    extrude(amount=-CUT_EXTRUDE2_DEPTH, mode=Mode.SUBTRACT)

    # Sketch6 → Cut-Extrude3 (cut, through all)
    with BuildSketch(Plane.XY.offset(-3)):
        with Locations((-93.85, 428.85)):
            Circle(SKETCH6_R)
    extrude(amount=-CUT_EXTRUDE3_DEPTH, mode=Mode.SUBTRACT)

    # Fillet1
    fillet1_edges = [part.edges().sort_by_distance(p)[0] for p in [
        (-15, 450, 0),
        (115, 200, 0),
    ]]
    fillet(fillet1_edges, radius=FILLET1_R)

    # M10 Clearance Hole1
    with Locations(Plane.XY.offset(5)):
        with Locations((-92.5, 387.5), (-92.5, 342.5)):
            Hole(M10_CLEARANCE_HOLE1_D / 2, depth=M10_CLEARANCE_HOLE1_DEPTH)
            with Locations((0, 0, -(M10_CLEARANCE_HOLE1_DEPTH + M10_CLEARANCE_HOLE1_TIP / 2))):  # 118° drill point
                Cone(0, M10_CLEARANCE_HOLE1_D / 2, M10_CLEARANCE_HOLE1_TIP, mode=Mode.SUBTRACT)


solid = part.part
